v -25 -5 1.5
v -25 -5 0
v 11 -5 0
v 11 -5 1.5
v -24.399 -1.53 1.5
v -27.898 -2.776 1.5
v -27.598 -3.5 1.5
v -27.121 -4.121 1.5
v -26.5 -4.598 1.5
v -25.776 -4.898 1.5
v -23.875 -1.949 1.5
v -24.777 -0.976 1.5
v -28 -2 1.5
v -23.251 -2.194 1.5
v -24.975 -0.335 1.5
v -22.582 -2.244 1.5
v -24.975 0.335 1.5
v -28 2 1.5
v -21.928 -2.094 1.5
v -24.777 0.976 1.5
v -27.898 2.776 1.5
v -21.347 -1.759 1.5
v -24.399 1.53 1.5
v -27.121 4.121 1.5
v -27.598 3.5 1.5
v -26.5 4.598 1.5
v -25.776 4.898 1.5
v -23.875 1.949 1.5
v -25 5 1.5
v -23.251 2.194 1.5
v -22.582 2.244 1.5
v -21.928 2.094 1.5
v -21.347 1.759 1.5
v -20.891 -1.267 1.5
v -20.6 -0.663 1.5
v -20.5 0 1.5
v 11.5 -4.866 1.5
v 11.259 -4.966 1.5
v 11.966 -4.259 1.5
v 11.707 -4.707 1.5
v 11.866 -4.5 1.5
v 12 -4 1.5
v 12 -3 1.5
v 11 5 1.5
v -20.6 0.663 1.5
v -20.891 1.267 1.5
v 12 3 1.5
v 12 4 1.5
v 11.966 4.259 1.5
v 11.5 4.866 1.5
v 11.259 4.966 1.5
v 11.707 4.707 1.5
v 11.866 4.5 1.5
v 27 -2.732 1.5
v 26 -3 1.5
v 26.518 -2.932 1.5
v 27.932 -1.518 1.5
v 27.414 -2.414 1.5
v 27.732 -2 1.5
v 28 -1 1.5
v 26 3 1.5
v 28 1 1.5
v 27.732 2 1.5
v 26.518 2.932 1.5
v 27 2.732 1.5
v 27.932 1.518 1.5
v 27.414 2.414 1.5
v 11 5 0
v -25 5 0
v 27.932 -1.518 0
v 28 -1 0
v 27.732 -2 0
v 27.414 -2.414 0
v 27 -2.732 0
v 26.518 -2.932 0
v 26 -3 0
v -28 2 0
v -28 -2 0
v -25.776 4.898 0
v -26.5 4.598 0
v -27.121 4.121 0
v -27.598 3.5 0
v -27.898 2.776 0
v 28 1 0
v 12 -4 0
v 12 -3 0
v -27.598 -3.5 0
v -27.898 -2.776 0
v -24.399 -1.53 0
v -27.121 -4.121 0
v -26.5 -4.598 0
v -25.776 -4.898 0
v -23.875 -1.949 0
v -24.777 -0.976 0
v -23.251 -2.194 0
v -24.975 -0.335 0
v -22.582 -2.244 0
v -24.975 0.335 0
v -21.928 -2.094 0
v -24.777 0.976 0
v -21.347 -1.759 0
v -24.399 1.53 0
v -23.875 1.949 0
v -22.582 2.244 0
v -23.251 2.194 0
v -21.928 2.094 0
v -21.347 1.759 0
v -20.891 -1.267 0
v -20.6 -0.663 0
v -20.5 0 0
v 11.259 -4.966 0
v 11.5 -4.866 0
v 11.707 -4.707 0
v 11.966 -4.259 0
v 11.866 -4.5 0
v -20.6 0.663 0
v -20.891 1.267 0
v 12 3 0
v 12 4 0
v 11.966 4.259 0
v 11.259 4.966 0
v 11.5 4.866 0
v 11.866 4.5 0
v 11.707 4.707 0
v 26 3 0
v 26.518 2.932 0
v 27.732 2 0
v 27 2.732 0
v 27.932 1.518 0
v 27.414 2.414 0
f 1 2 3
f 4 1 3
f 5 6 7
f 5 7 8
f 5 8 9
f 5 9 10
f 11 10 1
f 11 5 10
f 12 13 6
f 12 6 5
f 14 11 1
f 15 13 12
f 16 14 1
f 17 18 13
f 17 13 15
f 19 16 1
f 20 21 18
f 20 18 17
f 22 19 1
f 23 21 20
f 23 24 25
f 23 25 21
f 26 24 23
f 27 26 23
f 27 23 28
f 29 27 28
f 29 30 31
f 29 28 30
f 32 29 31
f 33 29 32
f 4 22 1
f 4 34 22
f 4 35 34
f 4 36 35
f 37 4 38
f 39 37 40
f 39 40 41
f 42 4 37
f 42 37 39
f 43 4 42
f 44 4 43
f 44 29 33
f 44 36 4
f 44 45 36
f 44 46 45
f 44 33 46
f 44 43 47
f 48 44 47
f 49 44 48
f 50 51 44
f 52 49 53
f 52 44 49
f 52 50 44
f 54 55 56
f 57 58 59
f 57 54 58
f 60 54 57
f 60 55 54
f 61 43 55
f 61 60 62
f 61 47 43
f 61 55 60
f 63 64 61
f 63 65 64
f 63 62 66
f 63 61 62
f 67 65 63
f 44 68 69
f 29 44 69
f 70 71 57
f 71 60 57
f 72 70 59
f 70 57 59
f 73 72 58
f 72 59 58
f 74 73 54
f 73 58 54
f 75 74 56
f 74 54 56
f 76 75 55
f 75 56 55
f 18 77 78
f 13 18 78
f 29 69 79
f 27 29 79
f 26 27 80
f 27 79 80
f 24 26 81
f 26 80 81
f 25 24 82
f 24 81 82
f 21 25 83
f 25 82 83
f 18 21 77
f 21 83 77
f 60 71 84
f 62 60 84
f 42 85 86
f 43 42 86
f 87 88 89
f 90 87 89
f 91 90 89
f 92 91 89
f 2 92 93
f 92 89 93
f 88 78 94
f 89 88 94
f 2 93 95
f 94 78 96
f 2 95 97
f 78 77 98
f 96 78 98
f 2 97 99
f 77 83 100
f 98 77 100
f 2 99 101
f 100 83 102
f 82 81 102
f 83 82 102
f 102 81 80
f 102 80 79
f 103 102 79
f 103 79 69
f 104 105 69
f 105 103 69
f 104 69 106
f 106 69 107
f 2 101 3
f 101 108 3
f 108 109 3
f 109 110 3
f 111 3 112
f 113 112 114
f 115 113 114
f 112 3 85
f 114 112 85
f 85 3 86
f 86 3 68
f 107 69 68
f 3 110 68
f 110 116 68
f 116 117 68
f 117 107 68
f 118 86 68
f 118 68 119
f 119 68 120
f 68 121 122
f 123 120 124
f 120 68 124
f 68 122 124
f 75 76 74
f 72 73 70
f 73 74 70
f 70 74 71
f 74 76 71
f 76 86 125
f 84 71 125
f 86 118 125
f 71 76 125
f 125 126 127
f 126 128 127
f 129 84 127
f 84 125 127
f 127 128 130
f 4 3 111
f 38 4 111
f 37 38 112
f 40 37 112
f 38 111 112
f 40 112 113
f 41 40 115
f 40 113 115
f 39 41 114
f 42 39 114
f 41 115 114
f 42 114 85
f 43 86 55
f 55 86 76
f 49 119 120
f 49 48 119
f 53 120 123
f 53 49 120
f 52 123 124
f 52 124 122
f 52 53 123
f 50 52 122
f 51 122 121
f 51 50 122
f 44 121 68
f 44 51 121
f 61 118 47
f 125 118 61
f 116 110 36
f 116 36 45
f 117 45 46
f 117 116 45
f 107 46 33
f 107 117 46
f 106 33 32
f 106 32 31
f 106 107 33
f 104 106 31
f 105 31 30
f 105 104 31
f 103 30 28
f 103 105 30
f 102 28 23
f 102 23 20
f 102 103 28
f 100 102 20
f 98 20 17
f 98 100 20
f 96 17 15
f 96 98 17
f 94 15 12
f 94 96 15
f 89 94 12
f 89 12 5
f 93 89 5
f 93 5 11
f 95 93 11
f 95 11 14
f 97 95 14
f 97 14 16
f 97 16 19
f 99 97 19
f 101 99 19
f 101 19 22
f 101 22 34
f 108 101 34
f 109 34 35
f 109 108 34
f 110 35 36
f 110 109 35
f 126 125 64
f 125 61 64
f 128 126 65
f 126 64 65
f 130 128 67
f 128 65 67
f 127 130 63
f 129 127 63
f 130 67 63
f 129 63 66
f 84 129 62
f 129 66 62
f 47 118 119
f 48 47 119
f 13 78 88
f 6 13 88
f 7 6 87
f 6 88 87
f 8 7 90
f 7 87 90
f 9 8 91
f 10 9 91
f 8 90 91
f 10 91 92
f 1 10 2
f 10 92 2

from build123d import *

# Parameters (mm, degrees)
F0_R     = 2.25
F0_W     = 16
F0_H     = 6
F1_DEPTH = 1.5
F2_R     = 1
F3_R     = 2


with BuildPart() as f1:
    # F0 (on Top) → F1 (new body)
    with BuildSketch(Plane.XY):
        with BuildLine():
            Line((-25, -5), (11, -5))
            ThreePointArc((11, -5), (11.707107, -4.707107), (12, -4))
            Line((12, -4), (12, -3))
            Line((12, -3), (12, 3))
            Line((12, 3), (12, 5))
            Line((12, 5), (-25, 5))
            ThreePointArc((-25, 5), (-27.12132, 4.12132), (-28, 2))
            Line((-28, 2), (-28, -2))
            ThreePointArc((-28, -2), (-27.12132, -4.12132), (-25, -5))
        make_face()
        with Locations((-22.75, 0)):
            Circle(F0_R, mode=Mode.SUBTRACT)
        with Locations((20, 0)):
            Rectangle(F0_W, F0_H)
    extrude(amount=F1_DEPTH)

    # F2
    f2_edges = [f1.edges().sort_by_distance(p)[0] for p in [
        (12, 5, 0.75),
    ]]
    fillet(f2_edges, radius=F2_R)

    # F3
    f3_edges = [f1.edges().sort_by_distance(p)[0] for p in [
        (28, 3, 0.75),
        (28, -3, 0.75),
    ]]
    fillet(f3_edges, radius=F3_R)


solid = f1.part
